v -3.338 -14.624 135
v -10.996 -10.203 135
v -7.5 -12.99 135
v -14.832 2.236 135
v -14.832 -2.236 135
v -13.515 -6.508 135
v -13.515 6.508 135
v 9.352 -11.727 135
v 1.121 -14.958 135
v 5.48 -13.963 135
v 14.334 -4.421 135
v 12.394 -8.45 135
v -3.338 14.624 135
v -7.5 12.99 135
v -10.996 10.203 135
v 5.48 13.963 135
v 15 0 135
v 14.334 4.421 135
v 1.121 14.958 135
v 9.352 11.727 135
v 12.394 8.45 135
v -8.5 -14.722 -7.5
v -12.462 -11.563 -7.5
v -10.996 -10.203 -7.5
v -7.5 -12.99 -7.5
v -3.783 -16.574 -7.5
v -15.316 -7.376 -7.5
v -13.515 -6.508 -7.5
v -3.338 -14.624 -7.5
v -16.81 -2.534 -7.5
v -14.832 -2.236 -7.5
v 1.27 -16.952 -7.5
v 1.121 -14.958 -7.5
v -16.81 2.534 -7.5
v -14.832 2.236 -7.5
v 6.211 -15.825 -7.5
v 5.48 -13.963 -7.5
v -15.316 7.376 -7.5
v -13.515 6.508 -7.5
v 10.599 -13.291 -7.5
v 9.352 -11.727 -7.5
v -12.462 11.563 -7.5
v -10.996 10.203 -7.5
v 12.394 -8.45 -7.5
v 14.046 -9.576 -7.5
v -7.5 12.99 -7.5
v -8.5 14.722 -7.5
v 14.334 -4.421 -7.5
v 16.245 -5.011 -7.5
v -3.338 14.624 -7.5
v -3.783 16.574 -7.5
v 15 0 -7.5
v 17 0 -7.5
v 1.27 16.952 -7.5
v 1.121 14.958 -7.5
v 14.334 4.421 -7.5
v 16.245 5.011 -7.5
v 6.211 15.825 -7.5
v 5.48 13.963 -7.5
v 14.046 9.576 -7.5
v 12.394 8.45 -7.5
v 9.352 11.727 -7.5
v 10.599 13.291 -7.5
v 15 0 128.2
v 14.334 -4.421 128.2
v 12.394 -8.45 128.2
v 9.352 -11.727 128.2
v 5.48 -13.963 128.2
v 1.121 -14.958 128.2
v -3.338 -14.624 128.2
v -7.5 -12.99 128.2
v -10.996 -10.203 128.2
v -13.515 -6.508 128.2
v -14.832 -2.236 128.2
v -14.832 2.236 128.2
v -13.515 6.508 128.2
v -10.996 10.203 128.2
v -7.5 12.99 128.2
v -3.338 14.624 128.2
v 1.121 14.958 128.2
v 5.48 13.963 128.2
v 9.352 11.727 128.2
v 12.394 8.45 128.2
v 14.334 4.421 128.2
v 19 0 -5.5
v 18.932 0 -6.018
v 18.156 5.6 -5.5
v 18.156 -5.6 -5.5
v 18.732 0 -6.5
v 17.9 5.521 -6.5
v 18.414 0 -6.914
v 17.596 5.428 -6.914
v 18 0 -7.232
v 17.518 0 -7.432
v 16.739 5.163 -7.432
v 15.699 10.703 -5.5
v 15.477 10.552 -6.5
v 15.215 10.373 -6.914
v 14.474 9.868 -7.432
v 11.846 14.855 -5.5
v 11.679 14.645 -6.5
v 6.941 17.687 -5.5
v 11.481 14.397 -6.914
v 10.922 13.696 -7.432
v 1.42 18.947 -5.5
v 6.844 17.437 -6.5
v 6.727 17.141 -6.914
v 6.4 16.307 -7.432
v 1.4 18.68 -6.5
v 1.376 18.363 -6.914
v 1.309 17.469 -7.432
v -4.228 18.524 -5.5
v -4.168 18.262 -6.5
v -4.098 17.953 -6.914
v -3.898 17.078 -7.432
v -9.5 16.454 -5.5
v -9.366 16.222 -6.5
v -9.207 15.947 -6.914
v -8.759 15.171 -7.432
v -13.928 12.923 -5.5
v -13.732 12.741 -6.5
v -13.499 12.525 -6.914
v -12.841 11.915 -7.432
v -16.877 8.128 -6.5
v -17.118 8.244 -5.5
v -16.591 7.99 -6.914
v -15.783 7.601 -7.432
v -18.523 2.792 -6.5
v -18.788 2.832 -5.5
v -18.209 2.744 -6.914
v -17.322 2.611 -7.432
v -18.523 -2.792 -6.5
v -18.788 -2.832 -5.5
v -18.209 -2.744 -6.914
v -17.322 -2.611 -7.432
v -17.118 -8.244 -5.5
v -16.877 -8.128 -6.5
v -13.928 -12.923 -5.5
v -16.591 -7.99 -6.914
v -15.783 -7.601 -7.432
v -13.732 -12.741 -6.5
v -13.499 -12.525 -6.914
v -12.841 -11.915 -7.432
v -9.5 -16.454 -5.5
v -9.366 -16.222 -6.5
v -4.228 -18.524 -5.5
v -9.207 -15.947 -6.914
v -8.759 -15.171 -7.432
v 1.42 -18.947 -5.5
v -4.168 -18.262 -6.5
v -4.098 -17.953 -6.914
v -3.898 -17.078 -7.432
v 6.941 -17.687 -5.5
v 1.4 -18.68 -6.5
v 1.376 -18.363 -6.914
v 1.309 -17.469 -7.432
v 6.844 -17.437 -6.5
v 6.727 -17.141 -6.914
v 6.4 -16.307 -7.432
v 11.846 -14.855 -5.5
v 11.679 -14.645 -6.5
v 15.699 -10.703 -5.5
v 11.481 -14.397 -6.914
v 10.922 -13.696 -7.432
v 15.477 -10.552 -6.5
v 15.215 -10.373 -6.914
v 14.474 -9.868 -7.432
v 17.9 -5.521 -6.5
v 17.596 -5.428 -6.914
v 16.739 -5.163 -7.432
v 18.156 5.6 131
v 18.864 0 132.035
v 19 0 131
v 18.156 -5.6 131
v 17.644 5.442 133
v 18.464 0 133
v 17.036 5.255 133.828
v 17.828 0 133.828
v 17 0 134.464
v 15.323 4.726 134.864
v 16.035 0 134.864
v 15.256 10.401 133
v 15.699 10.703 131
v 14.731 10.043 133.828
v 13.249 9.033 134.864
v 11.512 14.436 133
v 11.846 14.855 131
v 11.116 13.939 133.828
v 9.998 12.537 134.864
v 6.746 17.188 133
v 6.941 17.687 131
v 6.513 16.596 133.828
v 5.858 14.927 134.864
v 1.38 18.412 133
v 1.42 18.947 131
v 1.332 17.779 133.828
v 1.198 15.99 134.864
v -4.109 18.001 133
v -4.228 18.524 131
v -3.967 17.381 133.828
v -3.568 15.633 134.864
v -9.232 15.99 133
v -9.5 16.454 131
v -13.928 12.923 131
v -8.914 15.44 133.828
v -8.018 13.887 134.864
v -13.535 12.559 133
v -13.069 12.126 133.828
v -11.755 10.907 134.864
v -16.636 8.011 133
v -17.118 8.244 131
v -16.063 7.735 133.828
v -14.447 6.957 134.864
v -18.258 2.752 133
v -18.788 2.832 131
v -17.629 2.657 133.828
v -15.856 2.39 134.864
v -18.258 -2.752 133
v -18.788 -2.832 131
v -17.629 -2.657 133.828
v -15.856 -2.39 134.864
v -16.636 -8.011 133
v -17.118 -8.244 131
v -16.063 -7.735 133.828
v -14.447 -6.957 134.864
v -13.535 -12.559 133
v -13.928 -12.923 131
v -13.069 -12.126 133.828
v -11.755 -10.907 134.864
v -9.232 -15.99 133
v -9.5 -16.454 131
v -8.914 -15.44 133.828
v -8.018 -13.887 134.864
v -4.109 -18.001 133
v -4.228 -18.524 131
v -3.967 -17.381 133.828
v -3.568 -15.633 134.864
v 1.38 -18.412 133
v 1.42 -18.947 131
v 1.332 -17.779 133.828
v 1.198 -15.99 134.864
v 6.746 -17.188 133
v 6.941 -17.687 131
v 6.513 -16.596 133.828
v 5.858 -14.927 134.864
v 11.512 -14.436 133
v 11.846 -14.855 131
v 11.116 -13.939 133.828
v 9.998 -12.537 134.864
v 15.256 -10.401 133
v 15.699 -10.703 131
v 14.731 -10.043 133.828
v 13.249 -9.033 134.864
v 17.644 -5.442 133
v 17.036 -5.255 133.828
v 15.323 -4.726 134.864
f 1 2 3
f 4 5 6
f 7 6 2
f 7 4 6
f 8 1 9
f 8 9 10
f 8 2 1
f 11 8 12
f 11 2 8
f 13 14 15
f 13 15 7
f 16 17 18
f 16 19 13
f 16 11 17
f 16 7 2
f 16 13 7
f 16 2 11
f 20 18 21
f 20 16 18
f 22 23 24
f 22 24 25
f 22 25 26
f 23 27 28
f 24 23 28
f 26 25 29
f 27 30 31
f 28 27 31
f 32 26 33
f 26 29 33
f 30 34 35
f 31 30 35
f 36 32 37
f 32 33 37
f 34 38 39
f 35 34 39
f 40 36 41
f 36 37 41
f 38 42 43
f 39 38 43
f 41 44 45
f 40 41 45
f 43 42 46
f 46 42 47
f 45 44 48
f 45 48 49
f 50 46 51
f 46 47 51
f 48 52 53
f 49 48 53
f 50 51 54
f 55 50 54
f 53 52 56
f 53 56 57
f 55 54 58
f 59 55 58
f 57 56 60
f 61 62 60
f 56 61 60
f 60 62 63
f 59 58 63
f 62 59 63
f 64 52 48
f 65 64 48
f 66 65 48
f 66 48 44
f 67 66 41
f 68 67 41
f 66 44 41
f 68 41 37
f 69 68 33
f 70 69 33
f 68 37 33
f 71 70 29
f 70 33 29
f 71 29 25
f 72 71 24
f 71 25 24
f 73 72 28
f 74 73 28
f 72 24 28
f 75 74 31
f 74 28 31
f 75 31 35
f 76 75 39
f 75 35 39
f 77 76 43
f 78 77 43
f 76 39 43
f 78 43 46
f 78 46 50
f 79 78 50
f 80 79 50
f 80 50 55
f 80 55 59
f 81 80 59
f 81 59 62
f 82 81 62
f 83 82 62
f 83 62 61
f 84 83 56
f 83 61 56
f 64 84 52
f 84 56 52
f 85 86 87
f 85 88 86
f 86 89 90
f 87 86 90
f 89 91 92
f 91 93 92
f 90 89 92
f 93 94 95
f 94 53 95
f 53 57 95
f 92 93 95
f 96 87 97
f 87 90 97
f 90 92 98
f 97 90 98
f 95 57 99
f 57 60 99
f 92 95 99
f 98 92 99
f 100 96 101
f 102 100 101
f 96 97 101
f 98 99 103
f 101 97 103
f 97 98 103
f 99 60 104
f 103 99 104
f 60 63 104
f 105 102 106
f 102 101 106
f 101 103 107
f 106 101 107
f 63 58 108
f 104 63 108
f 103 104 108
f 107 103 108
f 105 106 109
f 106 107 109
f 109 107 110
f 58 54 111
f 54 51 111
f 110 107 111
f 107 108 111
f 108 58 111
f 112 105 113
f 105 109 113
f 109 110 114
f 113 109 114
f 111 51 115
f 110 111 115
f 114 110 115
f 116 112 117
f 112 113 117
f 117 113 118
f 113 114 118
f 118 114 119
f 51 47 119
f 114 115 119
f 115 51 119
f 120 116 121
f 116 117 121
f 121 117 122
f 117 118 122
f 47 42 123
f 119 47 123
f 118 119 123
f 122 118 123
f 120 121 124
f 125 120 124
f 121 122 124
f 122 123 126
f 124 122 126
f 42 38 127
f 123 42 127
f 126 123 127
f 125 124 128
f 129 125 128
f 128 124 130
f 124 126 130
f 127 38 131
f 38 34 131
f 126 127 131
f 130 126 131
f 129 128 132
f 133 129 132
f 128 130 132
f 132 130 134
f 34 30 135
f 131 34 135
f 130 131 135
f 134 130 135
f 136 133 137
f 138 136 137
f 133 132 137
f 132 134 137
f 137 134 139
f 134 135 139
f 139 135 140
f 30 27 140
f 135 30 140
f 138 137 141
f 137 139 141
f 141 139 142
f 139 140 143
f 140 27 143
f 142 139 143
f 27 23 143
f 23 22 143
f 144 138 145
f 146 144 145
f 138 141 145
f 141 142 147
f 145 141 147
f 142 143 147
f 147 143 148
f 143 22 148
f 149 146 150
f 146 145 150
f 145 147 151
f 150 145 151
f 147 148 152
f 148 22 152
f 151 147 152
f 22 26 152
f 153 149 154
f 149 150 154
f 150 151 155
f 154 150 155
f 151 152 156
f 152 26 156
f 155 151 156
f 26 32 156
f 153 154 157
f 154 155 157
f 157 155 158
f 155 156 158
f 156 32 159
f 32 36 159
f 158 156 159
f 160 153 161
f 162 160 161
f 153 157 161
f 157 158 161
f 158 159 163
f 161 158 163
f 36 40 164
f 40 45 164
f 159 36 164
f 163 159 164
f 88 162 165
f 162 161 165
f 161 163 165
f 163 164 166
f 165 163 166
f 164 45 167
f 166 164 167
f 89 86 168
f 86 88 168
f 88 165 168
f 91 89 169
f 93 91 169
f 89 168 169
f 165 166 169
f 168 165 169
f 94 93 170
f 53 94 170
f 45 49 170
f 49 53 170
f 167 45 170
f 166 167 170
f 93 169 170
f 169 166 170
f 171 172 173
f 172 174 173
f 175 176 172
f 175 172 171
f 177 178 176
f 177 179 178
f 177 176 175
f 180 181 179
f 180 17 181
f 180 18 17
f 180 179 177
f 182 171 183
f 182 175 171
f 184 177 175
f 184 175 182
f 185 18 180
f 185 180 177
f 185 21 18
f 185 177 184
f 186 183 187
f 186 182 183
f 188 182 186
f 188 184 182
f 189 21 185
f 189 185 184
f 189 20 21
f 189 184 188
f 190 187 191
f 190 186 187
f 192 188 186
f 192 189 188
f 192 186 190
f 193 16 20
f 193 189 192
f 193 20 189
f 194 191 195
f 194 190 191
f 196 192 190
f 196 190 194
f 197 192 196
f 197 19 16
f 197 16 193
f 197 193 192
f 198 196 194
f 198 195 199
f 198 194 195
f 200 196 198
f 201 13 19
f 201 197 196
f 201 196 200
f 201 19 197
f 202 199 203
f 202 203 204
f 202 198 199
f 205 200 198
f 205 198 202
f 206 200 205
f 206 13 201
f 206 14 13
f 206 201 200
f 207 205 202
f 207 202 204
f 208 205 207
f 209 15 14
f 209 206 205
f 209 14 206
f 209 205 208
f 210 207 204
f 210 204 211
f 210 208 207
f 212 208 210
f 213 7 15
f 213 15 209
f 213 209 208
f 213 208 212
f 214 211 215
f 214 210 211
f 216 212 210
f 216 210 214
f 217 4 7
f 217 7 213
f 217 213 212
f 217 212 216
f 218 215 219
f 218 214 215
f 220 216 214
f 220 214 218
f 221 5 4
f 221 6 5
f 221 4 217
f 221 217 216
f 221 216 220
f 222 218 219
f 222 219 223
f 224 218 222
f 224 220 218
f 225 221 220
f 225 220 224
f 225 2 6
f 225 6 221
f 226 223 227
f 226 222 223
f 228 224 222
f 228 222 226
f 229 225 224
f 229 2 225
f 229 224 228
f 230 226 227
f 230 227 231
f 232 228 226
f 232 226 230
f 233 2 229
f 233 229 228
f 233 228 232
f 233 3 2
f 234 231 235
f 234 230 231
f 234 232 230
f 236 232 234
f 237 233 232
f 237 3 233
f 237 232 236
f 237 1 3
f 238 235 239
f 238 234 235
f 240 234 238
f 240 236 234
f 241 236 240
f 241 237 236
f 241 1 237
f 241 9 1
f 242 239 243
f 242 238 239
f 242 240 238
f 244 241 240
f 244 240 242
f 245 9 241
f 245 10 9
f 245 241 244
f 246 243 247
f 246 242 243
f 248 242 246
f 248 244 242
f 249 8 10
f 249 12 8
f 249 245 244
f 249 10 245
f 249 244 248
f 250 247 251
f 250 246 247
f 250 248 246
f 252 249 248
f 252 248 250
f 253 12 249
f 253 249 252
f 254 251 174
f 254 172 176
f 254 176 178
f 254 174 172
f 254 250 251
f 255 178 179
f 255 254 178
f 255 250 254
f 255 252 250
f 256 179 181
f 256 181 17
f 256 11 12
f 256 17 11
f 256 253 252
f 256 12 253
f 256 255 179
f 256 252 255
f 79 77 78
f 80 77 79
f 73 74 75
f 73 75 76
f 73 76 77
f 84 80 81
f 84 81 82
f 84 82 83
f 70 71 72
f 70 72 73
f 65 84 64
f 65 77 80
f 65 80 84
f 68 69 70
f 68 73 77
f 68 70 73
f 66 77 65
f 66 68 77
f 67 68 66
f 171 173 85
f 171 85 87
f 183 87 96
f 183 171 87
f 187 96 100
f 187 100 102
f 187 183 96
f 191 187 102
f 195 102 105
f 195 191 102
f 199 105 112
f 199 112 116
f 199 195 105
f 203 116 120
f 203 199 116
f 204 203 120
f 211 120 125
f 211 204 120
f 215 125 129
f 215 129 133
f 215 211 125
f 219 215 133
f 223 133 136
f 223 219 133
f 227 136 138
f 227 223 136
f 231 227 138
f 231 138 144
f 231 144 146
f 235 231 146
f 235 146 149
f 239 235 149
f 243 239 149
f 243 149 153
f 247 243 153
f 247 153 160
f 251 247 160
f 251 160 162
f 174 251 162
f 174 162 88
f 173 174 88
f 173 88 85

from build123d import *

# Parameters (mm, degrees)
F0_R     = 19
F1_DEPTH = 135
F2_R     = 4
F3_R     = 19
F4_DEPTH = 7.5
F5_R     = 15
F6_DEPTH = 135.7
F7_R     = 2


with BuildPart() as f1:
    # F0 (on Top) → F1 (new body)
    with BuildSketch(Plane.XY):
        Circle(F0_R)
    extrude(amount=F1_DEPTH)

    # F2
    f2_edges = [f1.edges().sort_by_distance(p)[0] for p in [
        (-19, 0, 135),
    ]]
    fillet(f2_edges, radius=F2_R)

    # F3 (on Top) → F4 (join)
    with BuildSketch(Plane.XY):
        Circle(F3_R)
    extrude(amount=-F4_DEPTH)

    # F5 (on face) → F6 (cut)
    with BuildSketch(Plane(origin=(0, 0, -7.5), x_dir=(1, 0, 0), z_dir=(0, 0, -1))):
        Circle(F5_R)
    extrude(amount=-F6_DEPTH, mode=Mode.SUBTRACT)

    # F7
    f7_edges = [f1.edges().sort_by_distance(p)[0] for p in [
        (-19, 0, -7.5),
    ]]
    fillet(f7_edges, radius=F7_R)


solid = f1.part
